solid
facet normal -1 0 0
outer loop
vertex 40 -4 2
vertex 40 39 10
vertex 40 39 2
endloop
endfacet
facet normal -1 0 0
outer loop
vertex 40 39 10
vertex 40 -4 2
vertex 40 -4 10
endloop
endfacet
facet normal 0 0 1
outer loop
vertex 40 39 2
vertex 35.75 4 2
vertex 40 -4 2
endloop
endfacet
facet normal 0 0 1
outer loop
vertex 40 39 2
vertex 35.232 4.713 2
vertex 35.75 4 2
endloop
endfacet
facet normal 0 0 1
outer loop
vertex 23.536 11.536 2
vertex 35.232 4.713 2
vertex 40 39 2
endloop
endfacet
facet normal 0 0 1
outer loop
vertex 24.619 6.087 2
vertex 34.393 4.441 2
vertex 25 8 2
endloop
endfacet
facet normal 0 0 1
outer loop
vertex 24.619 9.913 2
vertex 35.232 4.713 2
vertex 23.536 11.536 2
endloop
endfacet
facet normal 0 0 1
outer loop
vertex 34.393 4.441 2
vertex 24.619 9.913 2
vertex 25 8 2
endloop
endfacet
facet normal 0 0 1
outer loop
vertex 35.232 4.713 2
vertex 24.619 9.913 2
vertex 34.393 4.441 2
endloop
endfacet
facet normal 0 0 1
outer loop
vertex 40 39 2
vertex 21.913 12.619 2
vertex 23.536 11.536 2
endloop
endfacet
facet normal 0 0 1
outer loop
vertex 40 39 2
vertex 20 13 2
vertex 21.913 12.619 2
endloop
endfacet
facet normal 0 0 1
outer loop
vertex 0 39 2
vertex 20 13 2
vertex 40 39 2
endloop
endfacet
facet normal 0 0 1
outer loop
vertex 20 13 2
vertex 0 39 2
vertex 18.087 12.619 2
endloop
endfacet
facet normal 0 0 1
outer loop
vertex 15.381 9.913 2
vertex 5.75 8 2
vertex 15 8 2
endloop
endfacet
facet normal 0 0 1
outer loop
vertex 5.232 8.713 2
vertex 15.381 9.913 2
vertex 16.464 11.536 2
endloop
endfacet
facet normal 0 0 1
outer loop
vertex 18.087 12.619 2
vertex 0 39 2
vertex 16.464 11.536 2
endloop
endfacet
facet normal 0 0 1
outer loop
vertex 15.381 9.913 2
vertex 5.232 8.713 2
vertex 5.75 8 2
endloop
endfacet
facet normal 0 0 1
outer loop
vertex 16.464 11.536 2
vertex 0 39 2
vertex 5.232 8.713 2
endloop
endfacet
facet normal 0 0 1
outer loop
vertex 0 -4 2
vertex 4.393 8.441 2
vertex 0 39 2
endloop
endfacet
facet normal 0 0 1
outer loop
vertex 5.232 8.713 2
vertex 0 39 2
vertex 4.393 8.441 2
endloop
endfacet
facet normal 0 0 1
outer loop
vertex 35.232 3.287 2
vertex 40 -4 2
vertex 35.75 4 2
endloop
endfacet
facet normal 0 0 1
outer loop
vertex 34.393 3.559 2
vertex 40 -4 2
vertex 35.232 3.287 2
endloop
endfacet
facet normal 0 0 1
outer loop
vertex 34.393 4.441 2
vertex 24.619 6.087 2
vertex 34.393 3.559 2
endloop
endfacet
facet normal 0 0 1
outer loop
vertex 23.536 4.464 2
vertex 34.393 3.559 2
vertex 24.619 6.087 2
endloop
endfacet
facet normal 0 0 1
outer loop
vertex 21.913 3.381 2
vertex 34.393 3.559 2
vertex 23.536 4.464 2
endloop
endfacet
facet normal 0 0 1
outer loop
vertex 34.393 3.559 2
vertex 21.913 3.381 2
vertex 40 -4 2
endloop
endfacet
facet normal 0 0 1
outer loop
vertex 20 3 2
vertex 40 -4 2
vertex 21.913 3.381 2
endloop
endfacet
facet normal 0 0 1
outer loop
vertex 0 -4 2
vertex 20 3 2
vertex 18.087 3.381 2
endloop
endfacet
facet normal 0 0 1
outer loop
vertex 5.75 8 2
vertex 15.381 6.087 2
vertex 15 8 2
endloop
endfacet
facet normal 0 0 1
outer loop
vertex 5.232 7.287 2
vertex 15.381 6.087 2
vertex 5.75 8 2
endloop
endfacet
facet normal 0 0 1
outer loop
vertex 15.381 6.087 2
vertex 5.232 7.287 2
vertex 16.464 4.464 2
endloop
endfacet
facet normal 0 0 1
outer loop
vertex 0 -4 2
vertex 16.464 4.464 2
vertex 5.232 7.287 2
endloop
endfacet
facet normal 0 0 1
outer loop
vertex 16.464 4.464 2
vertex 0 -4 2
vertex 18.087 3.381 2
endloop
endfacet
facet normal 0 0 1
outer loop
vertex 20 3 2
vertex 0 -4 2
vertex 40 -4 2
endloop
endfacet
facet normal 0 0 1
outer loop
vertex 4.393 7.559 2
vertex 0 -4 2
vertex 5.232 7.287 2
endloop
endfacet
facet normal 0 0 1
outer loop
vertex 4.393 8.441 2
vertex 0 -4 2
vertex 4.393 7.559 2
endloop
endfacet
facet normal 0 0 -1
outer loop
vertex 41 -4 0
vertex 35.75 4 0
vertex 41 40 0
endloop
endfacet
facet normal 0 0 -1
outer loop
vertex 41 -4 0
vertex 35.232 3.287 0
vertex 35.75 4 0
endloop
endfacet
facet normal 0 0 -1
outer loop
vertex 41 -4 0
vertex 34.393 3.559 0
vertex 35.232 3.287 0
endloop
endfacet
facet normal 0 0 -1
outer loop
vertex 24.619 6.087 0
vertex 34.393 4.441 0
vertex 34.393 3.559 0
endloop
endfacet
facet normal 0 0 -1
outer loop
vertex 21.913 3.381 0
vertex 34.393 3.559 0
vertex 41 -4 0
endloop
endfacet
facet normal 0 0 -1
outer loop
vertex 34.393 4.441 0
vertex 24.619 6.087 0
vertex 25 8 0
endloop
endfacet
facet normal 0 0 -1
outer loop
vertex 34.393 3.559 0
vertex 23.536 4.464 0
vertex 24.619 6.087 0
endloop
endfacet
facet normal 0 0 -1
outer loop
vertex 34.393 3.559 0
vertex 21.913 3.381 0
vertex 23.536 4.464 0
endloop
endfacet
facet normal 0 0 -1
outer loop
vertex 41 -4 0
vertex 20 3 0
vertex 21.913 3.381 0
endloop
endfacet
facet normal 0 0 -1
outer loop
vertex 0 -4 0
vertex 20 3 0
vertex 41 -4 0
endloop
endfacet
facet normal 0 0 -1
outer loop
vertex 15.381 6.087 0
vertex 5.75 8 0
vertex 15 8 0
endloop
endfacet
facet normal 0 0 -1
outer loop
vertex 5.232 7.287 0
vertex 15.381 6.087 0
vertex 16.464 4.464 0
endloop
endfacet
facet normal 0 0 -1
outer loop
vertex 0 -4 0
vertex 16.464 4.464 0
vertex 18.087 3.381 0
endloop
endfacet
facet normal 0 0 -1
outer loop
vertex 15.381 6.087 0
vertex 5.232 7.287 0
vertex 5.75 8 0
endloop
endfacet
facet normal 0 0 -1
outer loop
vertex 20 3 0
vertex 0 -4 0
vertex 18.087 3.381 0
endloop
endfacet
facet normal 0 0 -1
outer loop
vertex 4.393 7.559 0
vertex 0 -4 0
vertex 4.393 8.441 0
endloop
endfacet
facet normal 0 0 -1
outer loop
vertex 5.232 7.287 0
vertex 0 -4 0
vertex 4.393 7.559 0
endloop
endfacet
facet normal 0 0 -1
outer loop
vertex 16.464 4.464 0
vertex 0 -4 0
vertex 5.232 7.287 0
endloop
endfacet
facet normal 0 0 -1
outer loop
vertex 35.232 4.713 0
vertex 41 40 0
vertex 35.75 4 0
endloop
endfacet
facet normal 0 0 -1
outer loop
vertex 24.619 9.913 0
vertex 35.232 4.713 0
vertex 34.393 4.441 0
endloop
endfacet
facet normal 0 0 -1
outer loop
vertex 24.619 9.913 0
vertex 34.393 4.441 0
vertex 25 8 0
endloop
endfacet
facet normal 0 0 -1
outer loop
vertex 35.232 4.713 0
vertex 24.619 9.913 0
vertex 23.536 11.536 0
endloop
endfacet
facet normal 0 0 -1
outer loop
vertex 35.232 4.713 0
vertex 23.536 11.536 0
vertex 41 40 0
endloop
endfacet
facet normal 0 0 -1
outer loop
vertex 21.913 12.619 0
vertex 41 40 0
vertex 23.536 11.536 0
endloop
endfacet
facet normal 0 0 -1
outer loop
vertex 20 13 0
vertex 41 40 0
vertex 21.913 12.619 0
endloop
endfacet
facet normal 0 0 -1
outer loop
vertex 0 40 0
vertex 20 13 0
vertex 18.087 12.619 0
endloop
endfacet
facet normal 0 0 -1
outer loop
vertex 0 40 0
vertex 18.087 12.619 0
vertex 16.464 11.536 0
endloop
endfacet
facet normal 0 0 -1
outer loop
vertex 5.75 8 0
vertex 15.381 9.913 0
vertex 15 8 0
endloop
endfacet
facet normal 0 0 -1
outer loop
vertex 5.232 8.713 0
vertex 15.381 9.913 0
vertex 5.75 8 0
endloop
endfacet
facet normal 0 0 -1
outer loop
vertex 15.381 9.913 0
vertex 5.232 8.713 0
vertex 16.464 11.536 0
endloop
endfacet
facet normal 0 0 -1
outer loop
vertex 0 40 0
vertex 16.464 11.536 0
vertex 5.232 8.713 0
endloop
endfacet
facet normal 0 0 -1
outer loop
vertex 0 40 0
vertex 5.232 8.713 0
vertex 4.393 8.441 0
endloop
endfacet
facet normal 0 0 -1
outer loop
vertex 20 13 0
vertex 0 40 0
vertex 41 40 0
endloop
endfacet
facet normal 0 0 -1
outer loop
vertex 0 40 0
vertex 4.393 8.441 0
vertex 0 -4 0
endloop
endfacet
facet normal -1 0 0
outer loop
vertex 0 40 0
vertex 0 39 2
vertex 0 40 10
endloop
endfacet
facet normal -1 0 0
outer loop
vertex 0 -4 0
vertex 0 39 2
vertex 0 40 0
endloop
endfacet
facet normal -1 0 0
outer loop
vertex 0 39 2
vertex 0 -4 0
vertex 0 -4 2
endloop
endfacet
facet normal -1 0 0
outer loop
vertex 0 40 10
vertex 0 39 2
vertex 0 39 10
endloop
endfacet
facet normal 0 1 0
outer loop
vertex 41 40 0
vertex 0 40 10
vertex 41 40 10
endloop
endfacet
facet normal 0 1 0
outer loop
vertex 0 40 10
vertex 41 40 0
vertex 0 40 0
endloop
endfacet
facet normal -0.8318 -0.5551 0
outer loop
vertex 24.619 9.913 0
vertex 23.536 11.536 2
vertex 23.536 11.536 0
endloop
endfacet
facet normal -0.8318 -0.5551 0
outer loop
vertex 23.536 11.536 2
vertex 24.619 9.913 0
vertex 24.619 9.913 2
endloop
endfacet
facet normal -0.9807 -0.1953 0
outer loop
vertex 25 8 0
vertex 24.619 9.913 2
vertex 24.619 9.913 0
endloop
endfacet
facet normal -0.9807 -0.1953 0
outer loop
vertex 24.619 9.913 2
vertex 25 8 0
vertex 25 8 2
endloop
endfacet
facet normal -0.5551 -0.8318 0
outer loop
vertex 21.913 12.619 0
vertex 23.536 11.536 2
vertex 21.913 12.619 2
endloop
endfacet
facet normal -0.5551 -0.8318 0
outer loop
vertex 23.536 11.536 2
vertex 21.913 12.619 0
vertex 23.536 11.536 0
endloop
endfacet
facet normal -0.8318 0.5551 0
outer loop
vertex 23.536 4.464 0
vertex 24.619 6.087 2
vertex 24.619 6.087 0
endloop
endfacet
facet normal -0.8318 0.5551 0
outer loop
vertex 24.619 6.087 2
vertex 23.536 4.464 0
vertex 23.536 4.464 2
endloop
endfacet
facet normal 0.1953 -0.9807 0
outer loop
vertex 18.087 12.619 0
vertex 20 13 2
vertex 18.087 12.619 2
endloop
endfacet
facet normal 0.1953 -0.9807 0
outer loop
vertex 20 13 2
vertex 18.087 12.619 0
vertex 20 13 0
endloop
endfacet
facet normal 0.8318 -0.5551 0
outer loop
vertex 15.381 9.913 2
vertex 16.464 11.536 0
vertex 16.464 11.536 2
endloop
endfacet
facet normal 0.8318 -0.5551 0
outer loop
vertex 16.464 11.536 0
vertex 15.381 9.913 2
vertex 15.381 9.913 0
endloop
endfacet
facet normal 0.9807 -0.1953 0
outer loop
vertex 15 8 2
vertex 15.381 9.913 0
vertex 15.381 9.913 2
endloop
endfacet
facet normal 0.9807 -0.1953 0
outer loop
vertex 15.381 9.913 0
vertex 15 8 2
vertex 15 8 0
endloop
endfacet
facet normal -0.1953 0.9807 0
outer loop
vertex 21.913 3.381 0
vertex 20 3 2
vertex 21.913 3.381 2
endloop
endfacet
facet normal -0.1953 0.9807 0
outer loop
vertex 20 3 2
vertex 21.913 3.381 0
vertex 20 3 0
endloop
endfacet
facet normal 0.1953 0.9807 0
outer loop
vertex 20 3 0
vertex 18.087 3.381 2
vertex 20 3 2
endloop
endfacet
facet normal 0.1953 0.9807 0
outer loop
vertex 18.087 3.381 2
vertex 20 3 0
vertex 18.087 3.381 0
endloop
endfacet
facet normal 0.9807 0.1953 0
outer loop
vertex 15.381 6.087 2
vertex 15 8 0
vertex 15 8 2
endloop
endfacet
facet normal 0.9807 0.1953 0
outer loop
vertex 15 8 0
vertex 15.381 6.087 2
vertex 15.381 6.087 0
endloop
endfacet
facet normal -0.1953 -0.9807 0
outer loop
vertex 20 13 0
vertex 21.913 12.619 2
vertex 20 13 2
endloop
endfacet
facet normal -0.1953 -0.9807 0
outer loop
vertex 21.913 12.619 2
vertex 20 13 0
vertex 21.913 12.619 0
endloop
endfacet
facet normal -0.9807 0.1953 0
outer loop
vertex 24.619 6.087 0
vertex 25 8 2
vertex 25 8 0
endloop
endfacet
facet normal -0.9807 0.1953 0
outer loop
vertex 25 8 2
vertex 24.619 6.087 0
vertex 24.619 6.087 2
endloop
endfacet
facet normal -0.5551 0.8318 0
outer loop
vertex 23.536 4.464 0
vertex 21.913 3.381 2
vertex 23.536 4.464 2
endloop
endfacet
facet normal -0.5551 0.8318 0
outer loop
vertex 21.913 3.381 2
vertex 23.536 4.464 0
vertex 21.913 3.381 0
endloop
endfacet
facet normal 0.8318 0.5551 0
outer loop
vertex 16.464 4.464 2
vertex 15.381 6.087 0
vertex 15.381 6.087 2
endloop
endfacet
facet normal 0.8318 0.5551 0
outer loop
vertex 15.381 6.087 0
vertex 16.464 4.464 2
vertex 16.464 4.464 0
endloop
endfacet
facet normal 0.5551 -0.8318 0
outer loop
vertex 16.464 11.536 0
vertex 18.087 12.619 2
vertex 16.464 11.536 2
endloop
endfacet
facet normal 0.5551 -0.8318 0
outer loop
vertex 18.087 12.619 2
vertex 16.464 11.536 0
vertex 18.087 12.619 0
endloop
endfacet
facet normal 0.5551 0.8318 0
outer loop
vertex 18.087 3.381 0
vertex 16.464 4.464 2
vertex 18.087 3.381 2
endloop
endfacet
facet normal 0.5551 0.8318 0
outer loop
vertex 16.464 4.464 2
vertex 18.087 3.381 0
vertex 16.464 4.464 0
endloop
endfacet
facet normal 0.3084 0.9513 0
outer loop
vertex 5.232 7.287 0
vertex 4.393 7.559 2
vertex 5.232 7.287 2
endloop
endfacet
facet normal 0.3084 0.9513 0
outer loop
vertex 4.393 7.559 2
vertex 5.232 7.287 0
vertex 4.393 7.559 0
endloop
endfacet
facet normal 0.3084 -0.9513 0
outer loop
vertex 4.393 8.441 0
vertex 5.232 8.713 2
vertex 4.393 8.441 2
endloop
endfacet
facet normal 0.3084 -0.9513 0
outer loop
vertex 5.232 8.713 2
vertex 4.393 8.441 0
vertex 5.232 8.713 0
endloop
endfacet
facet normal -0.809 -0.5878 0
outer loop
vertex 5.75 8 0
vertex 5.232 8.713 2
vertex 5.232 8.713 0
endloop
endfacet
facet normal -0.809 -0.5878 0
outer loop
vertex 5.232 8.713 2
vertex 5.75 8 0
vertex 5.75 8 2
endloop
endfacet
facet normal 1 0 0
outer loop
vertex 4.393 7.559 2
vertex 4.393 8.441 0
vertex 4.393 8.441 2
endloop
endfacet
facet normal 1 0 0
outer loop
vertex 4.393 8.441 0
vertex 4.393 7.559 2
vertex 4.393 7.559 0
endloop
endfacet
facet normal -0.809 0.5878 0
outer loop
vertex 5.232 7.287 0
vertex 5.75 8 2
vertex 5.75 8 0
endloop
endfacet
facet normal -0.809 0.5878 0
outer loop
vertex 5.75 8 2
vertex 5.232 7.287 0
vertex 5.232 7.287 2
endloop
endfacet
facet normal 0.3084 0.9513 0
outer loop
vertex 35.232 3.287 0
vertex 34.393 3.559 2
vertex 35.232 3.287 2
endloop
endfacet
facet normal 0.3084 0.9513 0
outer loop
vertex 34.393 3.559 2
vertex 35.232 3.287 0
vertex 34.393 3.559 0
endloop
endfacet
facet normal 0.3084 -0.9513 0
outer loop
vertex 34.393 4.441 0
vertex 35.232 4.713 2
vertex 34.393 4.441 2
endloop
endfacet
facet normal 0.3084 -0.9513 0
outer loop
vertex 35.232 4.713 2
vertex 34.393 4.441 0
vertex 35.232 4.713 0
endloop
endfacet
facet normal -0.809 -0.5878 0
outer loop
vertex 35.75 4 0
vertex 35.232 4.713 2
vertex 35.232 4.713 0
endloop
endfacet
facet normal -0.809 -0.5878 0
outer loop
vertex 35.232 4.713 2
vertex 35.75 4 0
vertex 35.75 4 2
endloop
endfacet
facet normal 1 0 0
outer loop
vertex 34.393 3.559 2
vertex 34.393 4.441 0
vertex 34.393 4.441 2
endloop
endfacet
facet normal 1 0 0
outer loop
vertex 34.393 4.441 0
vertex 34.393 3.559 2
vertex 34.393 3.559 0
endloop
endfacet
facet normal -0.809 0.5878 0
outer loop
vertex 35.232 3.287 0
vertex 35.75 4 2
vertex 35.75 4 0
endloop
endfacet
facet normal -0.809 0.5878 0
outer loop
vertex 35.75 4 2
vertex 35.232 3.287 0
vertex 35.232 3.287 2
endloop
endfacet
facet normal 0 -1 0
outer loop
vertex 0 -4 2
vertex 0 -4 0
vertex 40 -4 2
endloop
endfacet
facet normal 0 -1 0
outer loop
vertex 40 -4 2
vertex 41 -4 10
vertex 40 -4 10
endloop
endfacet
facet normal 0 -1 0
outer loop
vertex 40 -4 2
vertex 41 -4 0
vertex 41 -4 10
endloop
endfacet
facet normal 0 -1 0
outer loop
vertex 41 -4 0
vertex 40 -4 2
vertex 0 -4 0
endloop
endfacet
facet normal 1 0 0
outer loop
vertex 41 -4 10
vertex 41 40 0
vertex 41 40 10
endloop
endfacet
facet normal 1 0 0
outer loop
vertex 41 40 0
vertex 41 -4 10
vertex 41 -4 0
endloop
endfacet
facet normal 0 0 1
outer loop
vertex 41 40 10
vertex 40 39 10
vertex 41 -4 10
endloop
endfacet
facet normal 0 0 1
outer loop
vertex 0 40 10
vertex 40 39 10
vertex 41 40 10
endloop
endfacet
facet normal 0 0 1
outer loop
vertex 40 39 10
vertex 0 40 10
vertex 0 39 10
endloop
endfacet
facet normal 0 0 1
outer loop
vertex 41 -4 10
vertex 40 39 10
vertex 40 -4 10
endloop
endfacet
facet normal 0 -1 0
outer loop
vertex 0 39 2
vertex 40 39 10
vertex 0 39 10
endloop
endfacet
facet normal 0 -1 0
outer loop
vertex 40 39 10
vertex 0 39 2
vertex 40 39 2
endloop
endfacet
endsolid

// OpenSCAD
difference(){
    cube([40,40,2]);
    translate([20,8,0])cylinder(d=10,h=2);
    translate([5,8,0])cylinder(d=1.5,h=2);
    translate([35,4,0])cylinder(d=1.5,h=2);
}
translate([0,-4,0])cube([40,4,2]);
translate([40,-4,0])cube([1,44,10]);
translate([0,40-1,0])cube([40,1,10]);
